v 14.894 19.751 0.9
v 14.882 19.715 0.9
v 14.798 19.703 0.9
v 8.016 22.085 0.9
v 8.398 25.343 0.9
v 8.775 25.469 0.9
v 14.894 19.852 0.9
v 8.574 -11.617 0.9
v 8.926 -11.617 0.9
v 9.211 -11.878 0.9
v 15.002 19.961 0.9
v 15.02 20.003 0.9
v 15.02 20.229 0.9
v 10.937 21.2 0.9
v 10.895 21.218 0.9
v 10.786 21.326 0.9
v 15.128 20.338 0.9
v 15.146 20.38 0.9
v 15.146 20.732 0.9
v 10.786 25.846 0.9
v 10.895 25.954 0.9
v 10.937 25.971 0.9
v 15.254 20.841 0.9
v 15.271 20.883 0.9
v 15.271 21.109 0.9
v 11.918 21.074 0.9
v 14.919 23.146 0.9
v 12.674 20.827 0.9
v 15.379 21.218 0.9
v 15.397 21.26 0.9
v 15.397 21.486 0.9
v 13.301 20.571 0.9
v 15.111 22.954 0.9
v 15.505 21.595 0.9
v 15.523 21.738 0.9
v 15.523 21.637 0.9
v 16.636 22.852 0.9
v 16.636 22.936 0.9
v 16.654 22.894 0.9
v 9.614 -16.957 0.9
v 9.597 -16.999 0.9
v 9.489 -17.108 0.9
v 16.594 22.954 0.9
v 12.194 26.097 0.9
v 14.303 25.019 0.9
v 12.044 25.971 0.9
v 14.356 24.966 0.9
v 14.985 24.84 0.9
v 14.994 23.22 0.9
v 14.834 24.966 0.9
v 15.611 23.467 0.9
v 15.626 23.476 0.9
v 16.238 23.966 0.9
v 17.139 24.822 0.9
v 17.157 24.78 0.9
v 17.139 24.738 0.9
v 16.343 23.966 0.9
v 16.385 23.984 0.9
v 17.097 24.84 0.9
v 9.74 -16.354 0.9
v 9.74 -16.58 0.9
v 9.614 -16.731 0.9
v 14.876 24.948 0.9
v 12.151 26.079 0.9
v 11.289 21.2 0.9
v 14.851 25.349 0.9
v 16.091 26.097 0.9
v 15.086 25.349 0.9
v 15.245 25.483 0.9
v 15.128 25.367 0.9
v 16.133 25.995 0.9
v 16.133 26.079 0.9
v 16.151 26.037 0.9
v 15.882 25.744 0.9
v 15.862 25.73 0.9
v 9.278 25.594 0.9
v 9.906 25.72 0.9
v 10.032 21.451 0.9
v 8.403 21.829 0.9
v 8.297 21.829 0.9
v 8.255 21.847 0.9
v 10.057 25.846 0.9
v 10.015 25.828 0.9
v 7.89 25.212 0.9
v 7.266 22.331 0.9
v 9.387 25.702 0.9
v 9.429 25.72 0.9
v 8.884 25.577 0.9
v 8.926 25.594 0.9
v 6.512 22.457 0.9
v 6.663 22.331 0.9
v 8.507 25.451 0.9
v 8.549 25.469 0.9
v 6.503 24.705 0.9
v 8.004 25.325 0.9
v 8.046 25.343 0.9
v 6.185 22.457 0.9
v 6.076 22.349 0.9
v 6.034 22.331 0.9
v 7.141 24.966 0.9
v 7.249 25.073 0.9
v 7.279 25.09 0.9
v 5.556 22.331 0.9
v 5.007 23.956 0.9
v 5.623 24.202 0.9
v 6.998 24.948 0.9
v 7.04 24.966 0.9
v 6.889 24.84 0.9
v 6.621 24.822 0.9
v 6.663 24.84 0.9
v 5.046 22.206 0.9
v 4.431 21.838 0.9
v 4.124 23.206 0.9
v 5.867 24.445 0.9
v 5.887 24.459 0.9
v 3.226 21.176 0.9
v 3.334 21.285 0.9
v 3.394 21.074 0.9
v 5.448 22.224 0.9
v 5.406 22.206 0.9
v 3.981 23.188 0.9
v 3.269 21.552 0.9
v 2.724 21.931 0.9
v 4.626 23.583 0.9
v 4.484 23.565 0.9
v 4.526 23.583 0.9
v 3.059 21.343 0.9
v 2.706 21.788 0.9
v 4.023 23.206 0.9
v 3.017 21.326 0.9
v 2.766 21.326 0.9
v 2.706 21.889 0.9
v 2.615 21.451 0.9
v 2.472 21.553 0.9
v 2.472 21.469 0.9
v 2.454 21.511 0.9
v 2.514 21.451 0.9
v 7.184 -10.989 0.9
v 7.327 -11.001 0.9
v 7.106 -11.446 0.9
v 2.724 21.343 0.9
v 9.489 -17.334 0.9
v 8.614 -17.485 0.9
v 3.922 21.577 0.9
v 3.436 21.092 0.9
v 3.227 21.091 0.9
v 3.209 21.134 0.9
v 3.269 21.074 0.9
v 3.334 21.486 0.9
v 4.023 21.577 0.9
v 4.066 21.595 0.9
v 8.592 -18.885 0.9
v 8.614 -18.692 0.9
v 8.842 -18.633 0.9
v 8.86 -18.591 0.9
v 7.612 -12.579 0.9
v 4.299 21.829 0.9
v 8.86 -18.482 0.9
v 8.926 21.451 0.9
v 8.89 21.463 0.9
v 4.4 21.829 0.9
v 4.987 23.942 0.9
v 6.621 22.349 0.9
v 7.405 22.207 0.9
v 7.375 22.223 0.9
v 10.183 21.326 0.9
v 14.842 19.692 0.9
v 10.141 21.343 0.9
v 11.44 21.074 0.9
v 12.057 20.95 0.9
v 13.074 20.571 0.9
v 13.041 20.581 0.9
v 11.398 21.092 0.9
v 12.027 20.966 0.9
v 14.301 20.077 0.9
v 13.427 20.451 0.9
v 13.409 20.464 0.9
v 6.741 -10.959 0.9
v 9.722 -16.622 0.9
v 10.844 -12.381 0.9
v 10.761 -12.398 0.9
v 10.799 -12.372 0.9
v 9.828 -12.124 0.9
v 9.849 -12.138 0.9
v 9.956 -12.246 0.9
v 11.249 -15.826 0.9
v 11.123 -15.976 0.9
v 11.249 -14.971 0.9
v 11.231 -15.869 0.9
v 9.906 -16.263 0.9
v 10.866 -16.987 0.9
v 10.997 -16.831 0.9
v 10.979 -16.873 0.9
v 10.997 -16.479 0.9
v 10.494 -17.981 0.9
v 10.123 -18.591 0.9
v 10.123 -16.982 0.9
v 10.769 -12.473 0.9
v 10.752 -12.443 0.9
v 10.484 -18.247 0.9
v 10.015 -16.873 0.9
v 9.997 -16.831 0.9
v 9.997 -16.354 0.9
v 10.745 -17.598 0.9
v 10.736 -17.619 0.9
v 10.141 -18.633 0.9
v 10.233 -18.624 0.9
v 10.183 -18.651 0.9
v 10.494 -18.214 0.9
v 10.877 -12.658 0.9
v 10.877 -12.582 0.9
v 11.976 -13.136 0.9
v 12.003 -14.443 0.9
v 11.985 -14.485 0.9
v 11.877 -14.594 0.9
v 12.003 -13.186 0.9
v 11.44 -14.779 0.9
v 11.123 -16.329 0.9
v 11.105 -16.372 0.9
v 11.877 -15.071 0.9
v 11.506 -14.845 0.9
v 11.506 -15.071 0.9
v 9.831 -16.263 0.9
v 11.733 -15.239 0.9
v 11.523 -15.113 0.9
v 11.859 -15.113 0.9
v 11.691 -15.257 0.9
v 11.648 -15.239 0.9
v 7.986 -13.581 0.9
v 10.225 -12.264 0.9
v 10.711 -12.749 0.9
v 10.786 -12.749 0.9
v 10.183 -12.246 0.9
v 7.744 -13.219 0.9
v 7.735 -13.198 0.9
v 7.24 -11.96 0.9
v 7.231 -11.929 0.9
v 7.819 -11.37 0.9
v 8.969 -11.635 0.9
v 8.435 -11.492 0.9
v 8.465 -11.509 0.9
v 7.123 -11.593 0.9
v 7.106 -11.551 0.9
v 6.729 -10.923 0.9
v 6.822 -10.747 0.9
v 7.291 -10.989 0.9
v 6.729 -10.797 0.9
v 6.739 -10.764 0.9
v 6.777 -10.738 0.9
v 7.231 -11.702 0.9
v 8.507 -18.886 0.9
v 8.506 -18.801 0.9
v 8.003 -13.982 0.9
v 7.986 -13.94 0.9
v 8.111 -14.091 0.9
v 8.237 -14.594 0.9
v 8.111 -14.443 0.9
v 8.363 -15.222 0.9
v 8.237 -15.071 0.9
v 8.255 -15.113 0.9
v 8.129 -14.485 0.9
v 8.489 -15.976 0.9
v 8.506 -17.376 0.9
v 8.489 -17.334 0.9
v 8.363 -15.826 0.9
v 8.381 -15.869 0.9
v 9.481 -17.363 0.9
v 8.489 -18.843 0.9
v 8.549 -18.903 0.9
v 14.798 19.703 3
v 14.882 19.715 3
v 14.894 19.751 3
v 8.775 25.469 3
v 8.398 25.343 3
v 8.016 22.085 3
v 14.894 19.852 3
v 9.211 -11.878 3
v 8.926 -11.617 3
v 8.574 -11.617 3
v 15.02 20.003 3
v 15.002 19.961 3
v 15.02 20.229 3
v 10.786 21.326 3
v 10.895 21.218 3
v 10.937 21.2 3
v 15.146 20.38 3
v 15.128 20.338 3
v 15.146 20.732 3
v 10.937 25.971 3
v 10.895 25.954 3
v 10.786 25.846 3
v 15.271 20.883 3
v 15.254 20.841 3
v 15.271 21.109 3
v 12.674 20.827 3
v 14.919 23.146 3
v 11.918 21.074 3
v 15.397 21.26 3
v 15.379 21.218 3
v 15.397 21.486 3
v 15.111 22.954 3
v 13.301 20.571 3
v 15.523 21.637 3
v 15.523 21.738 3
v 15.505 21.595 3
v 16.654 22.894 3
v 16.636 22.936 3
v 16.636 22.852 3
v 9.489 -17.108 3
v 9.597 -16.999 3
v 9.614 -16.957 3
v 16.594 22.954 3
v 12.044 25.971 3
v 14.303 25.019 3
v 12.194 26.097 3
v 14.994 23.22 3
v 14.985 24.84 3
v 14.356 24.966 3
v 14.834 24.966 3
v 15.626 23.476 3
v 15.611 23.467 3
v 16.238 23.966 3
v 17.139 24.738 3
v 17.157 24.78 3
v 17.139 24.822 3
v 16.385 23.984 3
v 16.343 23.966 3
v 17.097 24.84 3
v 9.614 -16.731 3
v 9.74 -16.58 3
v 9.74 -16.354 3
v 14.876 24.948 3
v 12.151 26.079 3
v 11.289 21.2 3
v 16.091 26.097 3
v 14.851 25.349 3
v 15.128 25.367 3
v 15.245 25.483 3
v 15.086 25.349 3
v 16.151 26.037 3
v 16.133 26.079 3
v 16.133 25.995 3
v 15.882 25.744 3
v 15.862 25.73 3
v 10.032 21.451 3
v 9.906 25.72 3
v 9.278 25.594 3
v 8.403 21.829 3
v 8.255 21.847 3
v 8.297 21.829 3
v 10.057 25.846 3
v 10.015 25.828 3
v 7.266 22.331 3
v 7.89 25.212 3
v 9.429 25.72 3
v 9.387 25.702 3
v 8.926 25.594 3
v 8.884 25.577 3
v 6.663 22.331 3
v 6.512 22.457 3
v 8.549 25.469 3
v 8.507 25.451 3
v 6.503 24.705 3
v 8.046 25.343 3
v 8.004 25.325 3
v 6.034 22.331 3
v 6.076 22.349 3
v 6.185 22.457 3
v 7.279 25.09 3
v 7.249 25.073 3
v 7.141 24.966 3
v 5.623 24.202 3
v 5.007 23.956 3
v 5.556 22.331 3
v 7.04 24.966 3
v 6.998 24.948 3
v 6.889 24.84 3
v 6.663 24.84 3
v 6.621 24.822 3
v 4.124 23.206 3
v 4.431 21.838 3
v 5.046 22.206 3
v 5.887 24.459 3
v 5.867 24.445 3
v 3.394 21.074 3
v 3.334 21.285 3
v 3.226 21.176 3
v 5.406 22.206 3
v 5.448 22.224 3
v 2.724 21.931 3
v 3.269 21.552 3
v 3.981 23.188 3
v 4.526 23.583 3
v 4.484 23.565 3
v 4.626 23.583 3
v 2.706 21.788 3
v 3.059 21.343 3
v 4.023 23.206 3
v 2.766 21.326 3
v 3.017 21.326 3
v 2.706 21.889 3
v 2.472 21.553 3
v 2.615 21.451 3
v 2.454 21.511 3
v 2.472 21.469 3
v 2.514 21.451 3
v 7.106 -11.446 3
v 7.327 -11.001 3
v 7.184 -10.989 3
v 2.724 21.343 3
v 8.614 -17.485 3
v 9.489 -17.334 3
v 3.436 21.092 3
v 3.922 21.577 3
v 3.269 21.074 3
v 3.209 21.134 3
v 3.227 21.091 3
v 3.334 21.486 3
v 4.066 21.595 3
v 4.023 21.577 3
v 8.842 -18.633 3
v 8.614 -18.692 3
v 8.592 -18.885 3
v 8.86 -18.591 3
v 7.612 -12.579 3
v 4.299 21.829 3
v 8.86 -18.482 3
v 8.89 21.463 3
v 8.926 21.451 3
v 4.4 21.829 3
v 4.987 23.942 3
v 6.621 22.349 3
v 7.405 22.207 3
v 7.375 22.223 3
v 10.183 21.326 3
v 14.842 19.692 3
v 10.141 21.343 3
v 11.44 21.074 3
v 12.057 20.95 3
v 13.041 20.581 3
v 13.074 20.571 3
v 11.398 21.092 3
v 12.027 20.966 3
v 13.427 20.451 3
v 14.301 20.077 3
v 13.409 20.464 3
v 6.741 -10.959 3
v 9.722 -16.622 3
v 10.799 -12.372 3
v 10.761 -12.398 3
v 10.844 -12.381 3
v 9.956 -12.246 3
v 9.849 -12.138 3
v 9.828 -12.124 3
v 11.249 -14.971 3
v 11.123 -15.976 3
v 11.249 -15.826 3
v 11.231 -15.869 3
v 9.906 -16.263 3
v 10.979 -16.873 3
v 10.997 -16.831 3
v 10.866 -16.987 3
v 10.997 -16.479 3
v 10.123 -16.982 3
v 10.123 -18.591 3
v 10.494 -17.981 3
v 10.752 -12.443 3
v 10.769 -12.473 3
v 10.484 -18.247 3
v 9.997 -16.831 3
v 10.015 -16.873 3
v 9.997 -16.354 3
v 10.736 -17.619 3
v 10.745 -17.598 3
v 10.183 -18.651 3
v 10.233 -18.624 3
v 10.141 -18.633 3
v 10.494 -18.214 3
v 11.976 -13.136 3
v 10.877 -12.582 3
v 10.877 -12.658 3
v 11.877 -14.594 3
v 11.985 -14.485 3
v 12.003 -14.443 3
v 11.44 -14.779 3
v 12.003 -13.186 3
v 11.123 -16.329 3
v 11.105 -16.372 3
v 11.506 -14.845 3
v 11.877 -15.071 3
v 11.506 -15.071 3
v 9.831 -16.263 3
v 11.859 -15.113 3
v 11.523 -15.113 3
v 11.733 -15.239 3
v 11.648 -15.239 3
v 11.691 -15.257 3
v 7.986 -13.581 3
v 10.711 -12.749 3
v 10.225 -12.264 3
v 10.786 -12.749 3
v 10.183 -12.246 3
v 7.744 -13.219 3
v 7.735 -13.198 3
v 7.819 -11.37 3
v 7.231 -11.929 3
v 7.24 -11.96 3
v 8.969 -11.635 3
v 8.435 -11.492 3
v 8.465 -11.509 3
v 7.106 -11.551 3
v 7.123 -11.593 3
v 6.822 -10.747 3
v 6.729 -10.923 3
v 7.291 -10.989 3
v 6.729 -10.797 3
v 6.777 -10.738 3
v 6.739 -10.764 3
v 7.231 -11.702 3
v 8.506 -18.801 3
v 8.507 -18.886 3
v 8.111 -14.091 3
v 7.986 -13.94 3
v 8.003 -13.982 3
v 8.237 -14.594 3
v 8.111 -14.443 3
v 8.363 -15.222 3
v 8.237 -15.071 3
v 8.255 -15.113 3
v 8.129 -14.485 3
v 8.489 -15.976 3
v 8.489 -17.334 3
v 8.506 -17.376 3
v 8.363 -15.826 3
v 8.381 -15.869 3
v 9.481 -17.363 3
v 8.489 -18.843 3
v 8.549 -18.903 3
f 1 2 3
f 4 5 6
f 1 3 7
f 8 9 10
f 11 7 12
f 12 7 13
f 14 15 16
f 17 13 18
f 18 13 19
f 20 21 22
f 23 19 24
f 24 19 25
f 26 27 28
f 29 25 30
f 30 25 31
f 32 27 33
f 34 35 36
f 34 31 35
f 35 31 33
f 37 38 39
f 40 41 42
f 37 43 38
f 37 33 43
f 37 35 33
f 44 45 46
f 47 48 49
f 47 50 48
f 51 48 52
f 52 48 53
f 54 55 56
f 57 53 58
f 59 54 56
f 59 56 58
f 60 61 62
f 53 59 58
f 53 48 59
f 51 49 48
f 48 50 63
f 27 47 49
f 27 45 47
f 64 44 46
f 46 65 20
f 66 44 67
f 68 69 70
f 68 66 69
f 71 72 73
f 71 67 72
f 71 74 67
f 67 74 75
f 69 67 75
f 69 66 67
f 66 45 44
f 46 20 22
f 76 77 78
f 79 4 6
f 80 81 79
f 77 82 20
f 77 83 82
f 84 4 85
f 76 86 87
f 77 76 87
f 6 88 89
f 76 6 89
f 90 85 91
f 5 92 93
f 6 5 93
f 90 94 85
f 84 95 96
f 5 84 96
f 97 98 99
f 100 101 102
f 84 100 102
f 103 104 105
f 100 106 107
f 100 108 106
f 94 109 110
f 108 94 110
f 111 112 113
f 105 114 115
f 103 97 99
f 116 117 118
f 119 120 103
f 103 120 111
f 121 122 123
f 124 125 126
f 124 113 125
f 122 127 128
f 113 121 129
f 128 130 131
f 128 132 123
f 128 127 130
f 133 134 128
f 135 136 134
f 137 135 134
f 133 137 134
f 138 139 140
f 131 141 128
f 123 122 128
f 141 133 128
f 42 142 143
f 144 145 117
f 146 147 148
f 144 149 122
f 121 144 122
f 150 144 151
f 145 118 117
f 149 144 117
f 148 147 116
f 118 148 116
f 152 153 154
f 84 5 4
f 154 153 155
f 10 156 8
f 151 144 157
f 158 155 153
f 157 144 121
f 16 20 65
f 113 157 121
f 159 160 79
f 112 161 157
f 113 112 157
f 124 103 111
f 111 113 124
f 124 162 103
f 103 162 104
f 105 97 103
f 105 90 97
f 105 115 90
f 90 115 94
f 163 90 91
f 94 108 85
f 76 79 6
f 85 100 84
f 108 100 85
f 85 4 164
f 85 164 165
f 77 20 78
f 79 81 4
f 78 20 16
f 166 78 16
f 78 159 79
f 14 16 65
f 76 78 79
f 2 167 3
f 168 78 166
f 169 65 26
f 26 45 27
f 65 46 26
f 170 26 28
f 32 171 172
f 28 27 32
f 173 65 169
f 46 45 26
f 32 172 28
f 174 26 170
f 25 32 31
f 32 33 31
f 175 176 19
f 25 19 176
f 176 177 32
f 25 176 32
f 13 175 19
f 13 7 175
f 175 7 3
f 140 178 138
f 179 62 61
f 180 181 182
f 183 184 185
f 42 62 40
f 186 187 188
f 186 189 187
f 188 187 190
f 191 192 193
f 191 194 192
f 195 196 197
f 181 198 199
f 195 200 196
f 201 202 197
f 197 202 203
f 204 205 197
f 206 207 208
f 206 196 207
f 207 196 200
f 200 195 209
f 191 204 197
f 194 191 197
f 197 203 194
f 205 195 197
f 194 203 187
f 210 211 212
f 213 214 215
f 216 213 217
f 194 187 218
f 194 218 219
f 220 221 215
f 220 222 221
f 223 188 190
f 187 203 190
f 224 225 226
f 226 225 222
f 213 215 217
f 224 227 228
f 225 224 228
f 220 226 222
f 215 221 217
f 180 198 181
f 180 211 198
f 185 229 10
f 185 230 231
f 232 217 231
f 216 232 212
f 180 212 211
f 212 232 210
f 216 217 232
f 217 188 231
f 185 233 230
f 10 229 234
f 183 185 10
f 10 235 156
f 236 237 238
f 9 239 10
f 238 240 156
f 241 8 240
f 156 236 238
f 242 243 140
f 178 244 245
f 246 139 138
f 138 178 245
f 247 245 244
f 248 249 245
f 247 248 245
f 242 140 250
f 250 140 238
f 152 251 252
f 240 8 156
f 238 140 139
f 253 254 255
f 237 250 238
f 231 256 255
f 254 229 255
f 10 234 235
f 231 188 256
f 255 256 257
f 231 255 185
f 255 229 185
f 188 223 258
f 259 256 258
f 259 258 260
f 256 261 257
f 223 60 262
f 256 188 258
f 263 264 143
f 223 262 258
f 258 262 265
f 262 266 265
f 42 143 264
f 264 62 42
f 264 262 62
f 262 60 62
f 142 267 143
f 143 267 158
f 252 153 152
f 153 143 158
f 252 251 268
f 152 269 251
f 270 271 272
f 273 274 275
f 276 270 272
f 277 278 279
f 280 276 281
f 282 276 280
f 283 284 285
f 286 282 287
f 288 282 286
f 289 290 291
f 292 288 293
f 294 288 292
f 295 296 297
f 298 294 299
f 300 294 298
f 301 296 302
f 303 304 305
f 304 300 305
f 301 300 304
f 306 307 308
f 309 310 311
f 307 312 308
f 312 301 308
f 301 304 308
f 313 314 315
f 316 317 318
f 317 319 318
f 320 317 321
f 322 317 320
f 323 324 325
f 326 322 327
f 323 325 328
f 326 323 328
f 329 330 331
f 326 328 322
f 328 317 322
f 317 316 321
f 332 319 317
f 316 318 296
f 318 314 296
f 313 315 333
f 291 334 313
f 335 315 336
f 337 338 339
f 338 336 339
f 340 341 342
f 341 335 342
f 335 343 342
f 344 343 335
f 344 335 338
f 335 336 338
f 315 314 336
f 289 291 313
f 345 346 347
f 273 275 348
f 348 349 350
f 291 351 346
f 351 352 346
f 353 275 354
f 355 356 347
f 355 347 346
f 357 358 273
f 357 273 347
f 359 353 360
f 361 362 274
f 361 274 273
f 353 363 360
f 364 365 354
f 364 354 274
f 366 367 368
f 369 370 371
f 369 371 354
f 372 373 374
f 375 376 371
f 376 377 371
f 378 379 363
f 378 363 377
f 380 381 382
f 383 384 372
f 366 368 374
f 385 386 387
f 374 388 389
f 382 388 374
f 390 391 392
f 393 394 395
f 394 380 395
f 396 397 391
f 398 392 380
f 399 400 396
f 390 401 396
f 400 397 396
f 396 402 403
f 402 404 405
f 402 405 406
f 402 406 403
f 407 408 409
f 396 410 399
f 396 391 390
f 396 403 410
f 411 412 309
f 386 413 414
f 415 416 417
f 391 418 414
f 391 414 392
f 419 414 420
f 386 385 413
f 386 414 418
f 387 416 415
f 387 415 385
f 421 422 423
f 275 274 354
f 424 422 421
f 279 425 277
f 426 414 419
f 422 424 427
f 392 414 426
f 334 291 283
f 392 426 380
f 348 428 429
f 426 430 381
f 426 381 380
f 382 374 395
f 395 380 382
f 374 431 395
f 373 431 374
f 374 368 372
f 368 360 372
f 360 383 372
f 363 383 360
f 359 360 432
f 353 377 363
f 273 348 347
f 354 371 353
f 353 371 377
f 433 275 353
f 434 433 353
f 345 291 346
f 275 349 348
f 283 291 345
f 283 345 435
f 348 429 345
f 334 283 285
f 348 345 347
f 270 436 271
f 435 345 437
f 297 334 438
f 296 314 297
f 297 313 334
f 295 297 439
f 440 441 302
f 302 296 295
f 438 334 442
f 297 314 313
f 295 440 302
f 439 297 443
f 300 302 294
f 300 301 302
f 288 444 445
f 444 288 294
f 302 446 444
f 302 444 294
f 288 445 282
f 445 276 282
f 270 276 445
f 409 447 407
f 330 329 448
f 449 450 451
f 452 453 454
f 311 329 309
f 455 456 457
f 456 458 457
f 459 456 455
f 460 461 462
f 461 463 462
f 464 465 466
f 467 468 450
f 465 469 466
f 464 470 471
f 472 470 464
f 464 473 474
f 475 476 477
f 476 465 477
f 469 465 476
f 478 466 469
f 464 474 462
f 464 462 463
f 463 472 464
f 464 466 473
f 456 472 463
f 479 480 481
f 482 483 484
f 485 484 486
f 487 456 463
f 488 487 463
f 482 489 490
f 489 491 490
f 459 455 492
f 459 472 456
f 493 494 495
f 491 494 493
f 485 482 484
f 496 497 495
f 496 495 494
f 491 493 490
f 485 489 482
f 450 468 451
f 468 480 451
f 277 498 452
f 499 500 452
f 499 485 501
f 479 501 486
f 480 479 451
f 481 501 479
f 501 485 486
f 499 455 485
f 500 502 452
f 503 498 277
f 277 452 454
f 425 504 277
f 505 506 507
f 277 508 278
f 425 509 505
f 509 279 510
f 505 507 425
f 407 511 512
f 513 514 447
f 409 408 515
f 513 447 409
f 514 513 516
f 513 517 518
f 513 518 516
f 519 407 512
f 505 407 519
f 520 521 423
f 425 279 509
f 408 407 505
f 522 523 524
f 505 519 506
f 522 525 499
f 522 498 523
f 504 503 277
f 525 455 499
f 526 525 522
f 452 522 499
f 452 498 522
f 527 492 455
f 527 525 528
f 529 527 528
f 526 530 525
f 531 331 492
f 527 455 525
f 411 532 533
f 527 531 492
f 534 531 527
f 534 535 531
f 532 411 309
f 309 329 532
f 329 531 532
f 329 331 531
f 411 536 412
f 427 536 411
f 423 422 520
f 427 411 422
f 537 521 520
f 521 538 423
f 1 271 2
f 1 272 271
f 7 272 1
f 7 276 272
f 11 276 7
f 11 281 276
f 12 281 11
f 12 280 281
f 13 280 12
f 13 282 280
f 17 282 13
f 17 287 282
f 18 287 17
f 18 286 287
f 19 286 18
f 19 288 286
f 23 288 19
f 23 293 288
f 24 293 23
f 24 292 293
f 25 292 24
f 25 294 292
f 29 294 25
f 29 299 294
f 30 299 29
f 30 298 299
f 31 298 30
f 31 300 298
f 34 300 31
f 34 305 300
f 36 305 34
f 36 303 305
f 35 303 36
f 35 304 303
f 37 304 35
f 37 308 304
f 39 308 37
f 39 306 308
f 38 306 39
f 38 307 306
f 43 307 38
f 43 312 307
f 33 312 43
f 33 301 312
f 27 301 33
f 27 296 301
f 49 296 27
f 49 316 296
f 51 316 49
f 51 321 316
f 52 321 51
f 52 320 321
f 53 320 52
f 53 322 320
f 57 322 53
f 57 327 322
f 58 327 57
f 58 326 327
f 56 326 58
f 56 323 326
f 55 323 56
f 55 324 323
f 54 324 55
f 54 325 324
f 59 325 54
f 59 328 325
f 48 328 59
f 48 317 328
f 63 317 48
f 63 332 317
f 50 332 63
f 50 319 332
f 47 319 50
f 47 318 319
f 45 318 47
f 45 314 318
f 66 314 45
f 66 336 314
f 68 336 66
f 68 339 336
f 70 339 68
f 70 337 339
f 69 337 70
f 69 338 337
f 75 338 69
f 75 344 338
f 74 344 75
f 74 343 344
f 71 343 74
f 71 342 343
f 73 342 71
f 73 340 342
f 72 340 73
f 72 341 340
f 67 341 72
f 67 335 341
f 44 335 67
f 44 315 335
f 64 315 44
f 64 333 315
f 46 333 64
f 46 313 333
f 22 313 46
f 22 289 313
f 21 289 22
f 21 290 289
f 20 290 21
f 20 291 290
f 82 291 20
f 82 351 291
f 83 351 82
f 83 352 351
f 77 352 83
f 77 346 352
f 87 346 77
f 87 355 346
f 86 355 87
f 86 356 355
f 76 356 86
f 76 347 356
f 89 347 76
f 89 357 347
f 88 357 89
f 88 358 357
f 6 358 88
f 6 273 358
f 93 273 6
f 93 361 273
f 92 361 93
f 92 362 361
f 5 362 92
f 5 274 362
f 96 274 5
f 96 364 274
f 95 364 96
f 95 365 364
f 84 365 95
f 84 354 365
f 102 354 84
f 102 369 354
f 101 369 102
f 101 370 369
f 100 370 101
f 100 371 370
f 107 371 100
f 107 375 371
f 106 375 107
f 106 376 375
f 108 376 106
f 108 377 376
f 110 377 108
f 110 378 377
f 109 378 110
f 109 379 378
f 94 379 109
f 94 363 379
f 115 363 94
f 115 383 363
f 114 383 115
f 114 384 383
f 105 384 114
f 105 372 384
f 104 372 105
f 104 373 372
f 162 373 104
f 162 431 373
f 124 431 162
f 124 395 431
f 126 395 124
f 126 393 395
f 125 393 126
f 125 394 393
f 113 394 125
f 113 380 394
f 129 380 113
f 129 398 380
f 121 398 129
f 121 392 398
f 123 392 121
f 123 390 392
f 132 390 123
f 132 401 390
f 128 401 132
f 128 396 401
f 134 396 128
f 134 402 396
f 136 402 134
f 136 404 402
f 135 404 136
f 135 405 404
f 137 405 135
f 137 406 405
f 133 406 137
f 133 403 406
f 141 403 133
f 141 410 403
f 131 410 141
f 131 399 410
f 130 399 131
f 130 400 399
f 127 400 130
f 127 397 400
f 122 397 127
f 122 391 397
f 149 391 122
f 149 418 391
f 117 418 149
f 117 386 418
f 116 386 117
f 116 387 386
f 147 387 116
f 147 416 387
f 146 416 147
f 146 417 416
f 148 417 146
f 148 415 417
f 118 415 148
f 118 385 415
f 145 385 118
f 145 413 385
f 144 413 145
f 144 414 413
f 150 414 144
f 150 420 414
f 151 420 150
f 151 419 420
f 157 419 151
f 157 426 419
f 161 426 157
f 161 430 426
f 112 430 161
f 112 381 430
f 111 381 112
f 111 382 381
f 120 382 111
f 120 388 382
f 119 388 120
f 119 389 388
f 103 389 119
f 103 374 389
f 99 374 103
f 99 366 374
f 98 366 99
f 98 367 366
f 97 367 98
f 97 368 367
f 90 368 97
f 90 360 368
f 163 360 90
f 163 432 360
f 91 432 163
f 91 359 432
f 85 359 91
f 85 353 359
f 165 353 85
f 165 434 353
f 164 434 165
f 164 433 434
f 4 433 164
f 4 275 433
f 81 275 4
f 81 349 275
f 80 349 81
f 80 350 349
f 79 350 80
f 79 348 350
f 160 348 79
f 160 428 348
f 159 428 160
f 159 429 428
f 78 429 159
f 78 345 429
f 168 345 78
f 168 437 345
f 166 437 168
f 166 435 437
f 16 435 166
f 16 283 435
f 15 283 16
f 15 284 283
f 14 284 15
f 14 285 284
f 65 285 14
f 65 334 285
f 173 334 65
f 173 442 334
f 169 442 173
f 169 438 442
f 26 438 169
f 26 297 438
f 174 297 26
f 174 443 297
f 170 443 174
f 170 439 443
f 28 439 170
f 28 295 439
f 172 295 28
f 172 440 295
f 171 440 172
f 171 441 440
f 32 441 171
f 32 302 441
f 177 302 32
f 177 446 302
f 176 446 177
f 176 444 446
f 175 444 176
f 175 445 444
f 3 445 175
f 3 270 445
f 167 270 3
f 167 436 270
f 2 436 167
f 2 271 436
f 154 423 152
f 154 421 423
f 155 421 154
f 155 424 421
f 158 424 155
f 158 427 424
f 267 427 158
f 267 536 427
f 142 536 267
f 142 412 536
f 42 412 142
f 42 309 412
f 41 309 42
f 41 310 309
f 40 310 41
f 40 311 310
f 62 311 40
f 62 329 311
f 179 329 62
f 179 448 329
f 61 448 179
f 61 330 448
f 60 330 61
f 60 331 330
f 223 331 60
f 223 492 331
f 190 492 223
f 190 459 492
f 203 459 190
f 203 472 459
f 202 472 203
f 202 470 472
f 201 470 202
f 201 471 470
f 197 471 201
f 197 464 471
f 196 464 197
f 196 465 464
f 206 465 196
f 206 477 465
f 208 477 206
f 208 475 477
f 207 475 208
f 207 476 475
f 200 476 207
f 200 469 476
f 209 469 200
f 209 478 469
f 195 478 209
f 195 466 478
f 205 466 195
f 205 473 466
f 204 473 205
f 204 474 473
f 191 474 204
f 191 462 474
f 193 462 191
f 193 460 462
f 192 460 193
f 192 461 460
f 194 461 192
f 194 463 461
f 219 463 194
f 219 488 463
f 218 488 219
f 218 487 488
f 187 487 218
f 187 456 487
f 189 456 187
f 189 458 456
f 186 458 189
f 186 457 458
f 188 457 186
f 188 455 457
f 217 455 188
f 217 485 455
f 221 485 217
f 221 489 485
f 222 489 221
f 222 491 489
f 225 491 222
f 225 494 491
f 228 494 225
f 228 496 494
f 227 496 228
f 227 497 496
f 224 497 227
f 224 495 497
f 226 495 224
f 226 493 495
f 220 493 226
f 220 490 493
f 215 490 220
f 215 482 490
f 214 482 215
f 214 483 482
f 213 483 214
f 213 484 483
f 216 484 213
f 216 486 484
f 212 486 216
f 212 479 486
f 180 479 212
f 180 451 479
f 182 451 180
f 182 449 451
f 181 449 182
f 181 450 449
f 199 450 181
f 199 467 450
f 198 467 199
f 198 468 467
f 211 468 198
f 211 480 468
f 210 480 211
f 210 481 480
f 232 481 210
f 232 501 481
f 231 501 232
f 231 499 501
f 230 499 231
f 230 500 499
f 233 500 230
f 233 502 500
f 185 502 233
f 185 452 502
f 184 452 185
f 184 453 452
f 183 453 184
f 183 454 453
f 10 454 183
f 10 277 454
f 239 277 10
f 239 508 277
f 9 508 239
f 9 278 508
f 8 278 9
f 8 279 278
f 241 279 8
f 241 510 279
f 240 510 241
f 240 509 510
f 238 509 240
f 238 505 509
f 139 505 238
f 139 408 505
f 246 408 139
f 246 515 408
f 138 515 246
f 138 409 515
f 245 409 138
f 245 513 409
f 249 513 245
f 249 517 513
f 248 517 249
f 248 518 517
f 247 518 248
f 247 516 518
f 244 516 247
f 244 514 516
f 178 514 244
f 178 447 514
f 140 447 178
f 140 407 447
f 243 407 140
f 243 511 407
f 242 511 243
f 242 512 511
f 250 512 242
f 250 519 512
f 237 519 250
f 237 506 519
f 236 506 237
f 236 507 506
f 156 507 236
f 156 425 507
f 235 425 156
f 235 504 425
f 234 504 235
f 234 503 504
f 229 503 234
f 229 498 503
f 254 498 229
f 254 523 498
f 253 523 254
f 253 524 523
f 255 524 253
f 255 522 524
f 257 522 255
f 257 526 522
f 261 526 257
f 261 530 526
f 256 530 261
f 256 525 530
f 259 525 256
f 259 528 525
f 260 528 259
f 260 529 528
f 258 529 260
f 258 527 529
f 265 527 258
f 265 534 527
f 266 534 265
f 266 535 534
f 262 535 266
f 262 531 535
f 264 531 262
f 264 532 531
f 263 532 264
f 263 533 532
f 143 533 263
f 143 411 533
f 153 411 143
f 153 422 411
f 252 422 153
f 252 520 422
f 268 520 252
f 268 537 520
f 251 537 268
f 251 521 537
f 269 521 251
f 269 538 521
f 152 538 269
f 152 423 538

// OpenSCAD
$fn = 24;
translate([0, -2.500, 0.900])
  linear_extrude(height=2.100) {
offset(r=0.06, $fn=8) {
    polygon(points=[[6.789,-8.297],[6.789,-8.423],[7.166,-8.926],[7.166,-9.051],[7.291,-9.177],[7.291,-9.429],[7.669,-10.057],[7.794,-10.686],[8.046,-11.063],[8.046,-11.440],[8.171,-11.566],[8.171,-11.943],[8.297,-12.069],[8.297,-12.571],[8.423,-12.697],[8.423,-13.326],[8.549,-13.451],[8.549,-14.834],[8.674,-14.960],[8.674,-16.217],[8.549,-16.343],[8.800,-16.091],[8.800,-15.966],[9.429,-14.834],[9.429,-14.583],[9.554,-14.457],[9.554,-14.206],[9.680,-14.080],[9.680,-13.829],[9.806,-13.703],[9.931,-13.703],[10.057,-13.829],[10.057,-14.331],[10.183,-14.457],[10.183,-16.217],[10.183,-16.091],[10.434,-15.714],[10.434,-15.463],[10.686,-15.086],[10.811,-14.457],[10.937,-14.331],[10.937,-13.954],[11.063,-13.829],[11.063,-13.451],[11.189,-13.326],[11.189,-12.446],[11.440,-12.194],[11.566,-12.320],[11.566,-12.571],[11.691,-12.697],[11.691,-13.074],[11.691,-12.697],[11.817,-12.571],[11.817,-12.069],[11.943,-11.943],[11.943,-10.686],[10.811,-9.931],[10.937,-10.057],[10.937,-10.183],[10.811,-10.309],[10.686,-10.309],[10.183,-9.806],[9.931,-9.806],[9.806,-9.680],[9.177,-9.429],[8.926,-9.177],[8.549,-9.177],[8.423,-9.051],[7.794,-8.926],[7.291,-8.549],[7.166,-8.549]], paths=[[0,1,2,3,4,5,6,7,8,9,10,11,12,13,14,15,16,17,18,19,20,21,22,23,24,25,26,27,28,29,30,31,32,33,34,35,36,37,38,39,40,41,42,43,44,45,46,47,48,49,50,51,52,53,54,55,56,57,58,59,60,61,62,63,64,65,66,67,68,69,70]]);
    polygon(points=[[17.097,27.280],[14.960,27.280],[14.834,27.406],[14.331,27.406],[14.206,27.531],[14.834,27.909],[15.086,27.909],[15.211,28.034],[15.840,28.286],[16.091,28.537],[12.194,28.537],[12.069,28.411],[10.937,28.411],[10.811,28.286],[10.057,28.286],[9.931,28.160],[9.429,28.160],[9.303,28.034],[8.926,28.034],[8.800,27.909],[8.549,27.909],[8.423,27.783],[8.046,27.783],[7.920,27.657],[7.291,27.531],[7.166,27.406],[7.040,27.406],[6.914,27.280],[6.663,27.280],[6.537,27.154],[5.909,26.903],[5.657,26.651],[5.029,26.400],[4.651,26.023],[4.526,26.023],[4.149,25.646],[4.023,25.646],[2.766,24.389],[2.766,24.263],[2.514,24.011],[2.640,24.011],[2.766,23.886],[3.017,23.886],[3.269,24.137],[3.394,24.011],[3.394,23.760],[3.269,23.634],[3.394,23.634],[3.897,24.137],[4.023,24.137],[4.274,24.389],[4.400,24.389],[5.029,24.766],[5.406,24.766],[5.531,24.891],[6.034,24.891],[6.160,25.017],[6.537,25.017],[6.663,24.891],[7.291,24.891],[7.417,24.766],[8.046,24.640],[8.297,24.389],[8.423,24.389],[8.926,24.011],[10.057,24.011],[10.183,23.886],[10.811,23.886],[10.937,23.760],[11.314,23.760],[11.440,23.634],[11.943,23.634],[12.069,23.509],[12.697,23.383],[13.074,23.131],[13.326,23.131],[13.451,23.006],[14.331,22.629],[14.834,22.251],[14.834,22.377],[14.960,22.503],[14.960,22.754],[15.086,22.880],[15.086,23.257],[15.211,23.383],[15.211,23.634],[15.337,23.760],[15.337,24.011],[15.463,24.137],[15.463,24.263],[16.594,25.394],[15.086,25.394],[14.834,25.646],[14.960,25.771],[15.589,26.023],[16.217,26.526],[16.343,26.526]], paths=[[0,1,2,3,4,5,6,7,8,9,10,11,12,13,14,15,16,17,18,19,20,21,22,23,24,25,26,27,28,29,30,31,32,33,34,35,36,37,38,39,40,41,42,43,44,45,46,47,48,49,50,51,52,53,54,55,56,57,58,59,60,61,62,63,64,65,66,67,68,69,70,71,72,73,74,75,76,77,78,79,80,81,82,83,84,85,86,87,88,89,90,91,92,93,94,95,96]]);
}
}
